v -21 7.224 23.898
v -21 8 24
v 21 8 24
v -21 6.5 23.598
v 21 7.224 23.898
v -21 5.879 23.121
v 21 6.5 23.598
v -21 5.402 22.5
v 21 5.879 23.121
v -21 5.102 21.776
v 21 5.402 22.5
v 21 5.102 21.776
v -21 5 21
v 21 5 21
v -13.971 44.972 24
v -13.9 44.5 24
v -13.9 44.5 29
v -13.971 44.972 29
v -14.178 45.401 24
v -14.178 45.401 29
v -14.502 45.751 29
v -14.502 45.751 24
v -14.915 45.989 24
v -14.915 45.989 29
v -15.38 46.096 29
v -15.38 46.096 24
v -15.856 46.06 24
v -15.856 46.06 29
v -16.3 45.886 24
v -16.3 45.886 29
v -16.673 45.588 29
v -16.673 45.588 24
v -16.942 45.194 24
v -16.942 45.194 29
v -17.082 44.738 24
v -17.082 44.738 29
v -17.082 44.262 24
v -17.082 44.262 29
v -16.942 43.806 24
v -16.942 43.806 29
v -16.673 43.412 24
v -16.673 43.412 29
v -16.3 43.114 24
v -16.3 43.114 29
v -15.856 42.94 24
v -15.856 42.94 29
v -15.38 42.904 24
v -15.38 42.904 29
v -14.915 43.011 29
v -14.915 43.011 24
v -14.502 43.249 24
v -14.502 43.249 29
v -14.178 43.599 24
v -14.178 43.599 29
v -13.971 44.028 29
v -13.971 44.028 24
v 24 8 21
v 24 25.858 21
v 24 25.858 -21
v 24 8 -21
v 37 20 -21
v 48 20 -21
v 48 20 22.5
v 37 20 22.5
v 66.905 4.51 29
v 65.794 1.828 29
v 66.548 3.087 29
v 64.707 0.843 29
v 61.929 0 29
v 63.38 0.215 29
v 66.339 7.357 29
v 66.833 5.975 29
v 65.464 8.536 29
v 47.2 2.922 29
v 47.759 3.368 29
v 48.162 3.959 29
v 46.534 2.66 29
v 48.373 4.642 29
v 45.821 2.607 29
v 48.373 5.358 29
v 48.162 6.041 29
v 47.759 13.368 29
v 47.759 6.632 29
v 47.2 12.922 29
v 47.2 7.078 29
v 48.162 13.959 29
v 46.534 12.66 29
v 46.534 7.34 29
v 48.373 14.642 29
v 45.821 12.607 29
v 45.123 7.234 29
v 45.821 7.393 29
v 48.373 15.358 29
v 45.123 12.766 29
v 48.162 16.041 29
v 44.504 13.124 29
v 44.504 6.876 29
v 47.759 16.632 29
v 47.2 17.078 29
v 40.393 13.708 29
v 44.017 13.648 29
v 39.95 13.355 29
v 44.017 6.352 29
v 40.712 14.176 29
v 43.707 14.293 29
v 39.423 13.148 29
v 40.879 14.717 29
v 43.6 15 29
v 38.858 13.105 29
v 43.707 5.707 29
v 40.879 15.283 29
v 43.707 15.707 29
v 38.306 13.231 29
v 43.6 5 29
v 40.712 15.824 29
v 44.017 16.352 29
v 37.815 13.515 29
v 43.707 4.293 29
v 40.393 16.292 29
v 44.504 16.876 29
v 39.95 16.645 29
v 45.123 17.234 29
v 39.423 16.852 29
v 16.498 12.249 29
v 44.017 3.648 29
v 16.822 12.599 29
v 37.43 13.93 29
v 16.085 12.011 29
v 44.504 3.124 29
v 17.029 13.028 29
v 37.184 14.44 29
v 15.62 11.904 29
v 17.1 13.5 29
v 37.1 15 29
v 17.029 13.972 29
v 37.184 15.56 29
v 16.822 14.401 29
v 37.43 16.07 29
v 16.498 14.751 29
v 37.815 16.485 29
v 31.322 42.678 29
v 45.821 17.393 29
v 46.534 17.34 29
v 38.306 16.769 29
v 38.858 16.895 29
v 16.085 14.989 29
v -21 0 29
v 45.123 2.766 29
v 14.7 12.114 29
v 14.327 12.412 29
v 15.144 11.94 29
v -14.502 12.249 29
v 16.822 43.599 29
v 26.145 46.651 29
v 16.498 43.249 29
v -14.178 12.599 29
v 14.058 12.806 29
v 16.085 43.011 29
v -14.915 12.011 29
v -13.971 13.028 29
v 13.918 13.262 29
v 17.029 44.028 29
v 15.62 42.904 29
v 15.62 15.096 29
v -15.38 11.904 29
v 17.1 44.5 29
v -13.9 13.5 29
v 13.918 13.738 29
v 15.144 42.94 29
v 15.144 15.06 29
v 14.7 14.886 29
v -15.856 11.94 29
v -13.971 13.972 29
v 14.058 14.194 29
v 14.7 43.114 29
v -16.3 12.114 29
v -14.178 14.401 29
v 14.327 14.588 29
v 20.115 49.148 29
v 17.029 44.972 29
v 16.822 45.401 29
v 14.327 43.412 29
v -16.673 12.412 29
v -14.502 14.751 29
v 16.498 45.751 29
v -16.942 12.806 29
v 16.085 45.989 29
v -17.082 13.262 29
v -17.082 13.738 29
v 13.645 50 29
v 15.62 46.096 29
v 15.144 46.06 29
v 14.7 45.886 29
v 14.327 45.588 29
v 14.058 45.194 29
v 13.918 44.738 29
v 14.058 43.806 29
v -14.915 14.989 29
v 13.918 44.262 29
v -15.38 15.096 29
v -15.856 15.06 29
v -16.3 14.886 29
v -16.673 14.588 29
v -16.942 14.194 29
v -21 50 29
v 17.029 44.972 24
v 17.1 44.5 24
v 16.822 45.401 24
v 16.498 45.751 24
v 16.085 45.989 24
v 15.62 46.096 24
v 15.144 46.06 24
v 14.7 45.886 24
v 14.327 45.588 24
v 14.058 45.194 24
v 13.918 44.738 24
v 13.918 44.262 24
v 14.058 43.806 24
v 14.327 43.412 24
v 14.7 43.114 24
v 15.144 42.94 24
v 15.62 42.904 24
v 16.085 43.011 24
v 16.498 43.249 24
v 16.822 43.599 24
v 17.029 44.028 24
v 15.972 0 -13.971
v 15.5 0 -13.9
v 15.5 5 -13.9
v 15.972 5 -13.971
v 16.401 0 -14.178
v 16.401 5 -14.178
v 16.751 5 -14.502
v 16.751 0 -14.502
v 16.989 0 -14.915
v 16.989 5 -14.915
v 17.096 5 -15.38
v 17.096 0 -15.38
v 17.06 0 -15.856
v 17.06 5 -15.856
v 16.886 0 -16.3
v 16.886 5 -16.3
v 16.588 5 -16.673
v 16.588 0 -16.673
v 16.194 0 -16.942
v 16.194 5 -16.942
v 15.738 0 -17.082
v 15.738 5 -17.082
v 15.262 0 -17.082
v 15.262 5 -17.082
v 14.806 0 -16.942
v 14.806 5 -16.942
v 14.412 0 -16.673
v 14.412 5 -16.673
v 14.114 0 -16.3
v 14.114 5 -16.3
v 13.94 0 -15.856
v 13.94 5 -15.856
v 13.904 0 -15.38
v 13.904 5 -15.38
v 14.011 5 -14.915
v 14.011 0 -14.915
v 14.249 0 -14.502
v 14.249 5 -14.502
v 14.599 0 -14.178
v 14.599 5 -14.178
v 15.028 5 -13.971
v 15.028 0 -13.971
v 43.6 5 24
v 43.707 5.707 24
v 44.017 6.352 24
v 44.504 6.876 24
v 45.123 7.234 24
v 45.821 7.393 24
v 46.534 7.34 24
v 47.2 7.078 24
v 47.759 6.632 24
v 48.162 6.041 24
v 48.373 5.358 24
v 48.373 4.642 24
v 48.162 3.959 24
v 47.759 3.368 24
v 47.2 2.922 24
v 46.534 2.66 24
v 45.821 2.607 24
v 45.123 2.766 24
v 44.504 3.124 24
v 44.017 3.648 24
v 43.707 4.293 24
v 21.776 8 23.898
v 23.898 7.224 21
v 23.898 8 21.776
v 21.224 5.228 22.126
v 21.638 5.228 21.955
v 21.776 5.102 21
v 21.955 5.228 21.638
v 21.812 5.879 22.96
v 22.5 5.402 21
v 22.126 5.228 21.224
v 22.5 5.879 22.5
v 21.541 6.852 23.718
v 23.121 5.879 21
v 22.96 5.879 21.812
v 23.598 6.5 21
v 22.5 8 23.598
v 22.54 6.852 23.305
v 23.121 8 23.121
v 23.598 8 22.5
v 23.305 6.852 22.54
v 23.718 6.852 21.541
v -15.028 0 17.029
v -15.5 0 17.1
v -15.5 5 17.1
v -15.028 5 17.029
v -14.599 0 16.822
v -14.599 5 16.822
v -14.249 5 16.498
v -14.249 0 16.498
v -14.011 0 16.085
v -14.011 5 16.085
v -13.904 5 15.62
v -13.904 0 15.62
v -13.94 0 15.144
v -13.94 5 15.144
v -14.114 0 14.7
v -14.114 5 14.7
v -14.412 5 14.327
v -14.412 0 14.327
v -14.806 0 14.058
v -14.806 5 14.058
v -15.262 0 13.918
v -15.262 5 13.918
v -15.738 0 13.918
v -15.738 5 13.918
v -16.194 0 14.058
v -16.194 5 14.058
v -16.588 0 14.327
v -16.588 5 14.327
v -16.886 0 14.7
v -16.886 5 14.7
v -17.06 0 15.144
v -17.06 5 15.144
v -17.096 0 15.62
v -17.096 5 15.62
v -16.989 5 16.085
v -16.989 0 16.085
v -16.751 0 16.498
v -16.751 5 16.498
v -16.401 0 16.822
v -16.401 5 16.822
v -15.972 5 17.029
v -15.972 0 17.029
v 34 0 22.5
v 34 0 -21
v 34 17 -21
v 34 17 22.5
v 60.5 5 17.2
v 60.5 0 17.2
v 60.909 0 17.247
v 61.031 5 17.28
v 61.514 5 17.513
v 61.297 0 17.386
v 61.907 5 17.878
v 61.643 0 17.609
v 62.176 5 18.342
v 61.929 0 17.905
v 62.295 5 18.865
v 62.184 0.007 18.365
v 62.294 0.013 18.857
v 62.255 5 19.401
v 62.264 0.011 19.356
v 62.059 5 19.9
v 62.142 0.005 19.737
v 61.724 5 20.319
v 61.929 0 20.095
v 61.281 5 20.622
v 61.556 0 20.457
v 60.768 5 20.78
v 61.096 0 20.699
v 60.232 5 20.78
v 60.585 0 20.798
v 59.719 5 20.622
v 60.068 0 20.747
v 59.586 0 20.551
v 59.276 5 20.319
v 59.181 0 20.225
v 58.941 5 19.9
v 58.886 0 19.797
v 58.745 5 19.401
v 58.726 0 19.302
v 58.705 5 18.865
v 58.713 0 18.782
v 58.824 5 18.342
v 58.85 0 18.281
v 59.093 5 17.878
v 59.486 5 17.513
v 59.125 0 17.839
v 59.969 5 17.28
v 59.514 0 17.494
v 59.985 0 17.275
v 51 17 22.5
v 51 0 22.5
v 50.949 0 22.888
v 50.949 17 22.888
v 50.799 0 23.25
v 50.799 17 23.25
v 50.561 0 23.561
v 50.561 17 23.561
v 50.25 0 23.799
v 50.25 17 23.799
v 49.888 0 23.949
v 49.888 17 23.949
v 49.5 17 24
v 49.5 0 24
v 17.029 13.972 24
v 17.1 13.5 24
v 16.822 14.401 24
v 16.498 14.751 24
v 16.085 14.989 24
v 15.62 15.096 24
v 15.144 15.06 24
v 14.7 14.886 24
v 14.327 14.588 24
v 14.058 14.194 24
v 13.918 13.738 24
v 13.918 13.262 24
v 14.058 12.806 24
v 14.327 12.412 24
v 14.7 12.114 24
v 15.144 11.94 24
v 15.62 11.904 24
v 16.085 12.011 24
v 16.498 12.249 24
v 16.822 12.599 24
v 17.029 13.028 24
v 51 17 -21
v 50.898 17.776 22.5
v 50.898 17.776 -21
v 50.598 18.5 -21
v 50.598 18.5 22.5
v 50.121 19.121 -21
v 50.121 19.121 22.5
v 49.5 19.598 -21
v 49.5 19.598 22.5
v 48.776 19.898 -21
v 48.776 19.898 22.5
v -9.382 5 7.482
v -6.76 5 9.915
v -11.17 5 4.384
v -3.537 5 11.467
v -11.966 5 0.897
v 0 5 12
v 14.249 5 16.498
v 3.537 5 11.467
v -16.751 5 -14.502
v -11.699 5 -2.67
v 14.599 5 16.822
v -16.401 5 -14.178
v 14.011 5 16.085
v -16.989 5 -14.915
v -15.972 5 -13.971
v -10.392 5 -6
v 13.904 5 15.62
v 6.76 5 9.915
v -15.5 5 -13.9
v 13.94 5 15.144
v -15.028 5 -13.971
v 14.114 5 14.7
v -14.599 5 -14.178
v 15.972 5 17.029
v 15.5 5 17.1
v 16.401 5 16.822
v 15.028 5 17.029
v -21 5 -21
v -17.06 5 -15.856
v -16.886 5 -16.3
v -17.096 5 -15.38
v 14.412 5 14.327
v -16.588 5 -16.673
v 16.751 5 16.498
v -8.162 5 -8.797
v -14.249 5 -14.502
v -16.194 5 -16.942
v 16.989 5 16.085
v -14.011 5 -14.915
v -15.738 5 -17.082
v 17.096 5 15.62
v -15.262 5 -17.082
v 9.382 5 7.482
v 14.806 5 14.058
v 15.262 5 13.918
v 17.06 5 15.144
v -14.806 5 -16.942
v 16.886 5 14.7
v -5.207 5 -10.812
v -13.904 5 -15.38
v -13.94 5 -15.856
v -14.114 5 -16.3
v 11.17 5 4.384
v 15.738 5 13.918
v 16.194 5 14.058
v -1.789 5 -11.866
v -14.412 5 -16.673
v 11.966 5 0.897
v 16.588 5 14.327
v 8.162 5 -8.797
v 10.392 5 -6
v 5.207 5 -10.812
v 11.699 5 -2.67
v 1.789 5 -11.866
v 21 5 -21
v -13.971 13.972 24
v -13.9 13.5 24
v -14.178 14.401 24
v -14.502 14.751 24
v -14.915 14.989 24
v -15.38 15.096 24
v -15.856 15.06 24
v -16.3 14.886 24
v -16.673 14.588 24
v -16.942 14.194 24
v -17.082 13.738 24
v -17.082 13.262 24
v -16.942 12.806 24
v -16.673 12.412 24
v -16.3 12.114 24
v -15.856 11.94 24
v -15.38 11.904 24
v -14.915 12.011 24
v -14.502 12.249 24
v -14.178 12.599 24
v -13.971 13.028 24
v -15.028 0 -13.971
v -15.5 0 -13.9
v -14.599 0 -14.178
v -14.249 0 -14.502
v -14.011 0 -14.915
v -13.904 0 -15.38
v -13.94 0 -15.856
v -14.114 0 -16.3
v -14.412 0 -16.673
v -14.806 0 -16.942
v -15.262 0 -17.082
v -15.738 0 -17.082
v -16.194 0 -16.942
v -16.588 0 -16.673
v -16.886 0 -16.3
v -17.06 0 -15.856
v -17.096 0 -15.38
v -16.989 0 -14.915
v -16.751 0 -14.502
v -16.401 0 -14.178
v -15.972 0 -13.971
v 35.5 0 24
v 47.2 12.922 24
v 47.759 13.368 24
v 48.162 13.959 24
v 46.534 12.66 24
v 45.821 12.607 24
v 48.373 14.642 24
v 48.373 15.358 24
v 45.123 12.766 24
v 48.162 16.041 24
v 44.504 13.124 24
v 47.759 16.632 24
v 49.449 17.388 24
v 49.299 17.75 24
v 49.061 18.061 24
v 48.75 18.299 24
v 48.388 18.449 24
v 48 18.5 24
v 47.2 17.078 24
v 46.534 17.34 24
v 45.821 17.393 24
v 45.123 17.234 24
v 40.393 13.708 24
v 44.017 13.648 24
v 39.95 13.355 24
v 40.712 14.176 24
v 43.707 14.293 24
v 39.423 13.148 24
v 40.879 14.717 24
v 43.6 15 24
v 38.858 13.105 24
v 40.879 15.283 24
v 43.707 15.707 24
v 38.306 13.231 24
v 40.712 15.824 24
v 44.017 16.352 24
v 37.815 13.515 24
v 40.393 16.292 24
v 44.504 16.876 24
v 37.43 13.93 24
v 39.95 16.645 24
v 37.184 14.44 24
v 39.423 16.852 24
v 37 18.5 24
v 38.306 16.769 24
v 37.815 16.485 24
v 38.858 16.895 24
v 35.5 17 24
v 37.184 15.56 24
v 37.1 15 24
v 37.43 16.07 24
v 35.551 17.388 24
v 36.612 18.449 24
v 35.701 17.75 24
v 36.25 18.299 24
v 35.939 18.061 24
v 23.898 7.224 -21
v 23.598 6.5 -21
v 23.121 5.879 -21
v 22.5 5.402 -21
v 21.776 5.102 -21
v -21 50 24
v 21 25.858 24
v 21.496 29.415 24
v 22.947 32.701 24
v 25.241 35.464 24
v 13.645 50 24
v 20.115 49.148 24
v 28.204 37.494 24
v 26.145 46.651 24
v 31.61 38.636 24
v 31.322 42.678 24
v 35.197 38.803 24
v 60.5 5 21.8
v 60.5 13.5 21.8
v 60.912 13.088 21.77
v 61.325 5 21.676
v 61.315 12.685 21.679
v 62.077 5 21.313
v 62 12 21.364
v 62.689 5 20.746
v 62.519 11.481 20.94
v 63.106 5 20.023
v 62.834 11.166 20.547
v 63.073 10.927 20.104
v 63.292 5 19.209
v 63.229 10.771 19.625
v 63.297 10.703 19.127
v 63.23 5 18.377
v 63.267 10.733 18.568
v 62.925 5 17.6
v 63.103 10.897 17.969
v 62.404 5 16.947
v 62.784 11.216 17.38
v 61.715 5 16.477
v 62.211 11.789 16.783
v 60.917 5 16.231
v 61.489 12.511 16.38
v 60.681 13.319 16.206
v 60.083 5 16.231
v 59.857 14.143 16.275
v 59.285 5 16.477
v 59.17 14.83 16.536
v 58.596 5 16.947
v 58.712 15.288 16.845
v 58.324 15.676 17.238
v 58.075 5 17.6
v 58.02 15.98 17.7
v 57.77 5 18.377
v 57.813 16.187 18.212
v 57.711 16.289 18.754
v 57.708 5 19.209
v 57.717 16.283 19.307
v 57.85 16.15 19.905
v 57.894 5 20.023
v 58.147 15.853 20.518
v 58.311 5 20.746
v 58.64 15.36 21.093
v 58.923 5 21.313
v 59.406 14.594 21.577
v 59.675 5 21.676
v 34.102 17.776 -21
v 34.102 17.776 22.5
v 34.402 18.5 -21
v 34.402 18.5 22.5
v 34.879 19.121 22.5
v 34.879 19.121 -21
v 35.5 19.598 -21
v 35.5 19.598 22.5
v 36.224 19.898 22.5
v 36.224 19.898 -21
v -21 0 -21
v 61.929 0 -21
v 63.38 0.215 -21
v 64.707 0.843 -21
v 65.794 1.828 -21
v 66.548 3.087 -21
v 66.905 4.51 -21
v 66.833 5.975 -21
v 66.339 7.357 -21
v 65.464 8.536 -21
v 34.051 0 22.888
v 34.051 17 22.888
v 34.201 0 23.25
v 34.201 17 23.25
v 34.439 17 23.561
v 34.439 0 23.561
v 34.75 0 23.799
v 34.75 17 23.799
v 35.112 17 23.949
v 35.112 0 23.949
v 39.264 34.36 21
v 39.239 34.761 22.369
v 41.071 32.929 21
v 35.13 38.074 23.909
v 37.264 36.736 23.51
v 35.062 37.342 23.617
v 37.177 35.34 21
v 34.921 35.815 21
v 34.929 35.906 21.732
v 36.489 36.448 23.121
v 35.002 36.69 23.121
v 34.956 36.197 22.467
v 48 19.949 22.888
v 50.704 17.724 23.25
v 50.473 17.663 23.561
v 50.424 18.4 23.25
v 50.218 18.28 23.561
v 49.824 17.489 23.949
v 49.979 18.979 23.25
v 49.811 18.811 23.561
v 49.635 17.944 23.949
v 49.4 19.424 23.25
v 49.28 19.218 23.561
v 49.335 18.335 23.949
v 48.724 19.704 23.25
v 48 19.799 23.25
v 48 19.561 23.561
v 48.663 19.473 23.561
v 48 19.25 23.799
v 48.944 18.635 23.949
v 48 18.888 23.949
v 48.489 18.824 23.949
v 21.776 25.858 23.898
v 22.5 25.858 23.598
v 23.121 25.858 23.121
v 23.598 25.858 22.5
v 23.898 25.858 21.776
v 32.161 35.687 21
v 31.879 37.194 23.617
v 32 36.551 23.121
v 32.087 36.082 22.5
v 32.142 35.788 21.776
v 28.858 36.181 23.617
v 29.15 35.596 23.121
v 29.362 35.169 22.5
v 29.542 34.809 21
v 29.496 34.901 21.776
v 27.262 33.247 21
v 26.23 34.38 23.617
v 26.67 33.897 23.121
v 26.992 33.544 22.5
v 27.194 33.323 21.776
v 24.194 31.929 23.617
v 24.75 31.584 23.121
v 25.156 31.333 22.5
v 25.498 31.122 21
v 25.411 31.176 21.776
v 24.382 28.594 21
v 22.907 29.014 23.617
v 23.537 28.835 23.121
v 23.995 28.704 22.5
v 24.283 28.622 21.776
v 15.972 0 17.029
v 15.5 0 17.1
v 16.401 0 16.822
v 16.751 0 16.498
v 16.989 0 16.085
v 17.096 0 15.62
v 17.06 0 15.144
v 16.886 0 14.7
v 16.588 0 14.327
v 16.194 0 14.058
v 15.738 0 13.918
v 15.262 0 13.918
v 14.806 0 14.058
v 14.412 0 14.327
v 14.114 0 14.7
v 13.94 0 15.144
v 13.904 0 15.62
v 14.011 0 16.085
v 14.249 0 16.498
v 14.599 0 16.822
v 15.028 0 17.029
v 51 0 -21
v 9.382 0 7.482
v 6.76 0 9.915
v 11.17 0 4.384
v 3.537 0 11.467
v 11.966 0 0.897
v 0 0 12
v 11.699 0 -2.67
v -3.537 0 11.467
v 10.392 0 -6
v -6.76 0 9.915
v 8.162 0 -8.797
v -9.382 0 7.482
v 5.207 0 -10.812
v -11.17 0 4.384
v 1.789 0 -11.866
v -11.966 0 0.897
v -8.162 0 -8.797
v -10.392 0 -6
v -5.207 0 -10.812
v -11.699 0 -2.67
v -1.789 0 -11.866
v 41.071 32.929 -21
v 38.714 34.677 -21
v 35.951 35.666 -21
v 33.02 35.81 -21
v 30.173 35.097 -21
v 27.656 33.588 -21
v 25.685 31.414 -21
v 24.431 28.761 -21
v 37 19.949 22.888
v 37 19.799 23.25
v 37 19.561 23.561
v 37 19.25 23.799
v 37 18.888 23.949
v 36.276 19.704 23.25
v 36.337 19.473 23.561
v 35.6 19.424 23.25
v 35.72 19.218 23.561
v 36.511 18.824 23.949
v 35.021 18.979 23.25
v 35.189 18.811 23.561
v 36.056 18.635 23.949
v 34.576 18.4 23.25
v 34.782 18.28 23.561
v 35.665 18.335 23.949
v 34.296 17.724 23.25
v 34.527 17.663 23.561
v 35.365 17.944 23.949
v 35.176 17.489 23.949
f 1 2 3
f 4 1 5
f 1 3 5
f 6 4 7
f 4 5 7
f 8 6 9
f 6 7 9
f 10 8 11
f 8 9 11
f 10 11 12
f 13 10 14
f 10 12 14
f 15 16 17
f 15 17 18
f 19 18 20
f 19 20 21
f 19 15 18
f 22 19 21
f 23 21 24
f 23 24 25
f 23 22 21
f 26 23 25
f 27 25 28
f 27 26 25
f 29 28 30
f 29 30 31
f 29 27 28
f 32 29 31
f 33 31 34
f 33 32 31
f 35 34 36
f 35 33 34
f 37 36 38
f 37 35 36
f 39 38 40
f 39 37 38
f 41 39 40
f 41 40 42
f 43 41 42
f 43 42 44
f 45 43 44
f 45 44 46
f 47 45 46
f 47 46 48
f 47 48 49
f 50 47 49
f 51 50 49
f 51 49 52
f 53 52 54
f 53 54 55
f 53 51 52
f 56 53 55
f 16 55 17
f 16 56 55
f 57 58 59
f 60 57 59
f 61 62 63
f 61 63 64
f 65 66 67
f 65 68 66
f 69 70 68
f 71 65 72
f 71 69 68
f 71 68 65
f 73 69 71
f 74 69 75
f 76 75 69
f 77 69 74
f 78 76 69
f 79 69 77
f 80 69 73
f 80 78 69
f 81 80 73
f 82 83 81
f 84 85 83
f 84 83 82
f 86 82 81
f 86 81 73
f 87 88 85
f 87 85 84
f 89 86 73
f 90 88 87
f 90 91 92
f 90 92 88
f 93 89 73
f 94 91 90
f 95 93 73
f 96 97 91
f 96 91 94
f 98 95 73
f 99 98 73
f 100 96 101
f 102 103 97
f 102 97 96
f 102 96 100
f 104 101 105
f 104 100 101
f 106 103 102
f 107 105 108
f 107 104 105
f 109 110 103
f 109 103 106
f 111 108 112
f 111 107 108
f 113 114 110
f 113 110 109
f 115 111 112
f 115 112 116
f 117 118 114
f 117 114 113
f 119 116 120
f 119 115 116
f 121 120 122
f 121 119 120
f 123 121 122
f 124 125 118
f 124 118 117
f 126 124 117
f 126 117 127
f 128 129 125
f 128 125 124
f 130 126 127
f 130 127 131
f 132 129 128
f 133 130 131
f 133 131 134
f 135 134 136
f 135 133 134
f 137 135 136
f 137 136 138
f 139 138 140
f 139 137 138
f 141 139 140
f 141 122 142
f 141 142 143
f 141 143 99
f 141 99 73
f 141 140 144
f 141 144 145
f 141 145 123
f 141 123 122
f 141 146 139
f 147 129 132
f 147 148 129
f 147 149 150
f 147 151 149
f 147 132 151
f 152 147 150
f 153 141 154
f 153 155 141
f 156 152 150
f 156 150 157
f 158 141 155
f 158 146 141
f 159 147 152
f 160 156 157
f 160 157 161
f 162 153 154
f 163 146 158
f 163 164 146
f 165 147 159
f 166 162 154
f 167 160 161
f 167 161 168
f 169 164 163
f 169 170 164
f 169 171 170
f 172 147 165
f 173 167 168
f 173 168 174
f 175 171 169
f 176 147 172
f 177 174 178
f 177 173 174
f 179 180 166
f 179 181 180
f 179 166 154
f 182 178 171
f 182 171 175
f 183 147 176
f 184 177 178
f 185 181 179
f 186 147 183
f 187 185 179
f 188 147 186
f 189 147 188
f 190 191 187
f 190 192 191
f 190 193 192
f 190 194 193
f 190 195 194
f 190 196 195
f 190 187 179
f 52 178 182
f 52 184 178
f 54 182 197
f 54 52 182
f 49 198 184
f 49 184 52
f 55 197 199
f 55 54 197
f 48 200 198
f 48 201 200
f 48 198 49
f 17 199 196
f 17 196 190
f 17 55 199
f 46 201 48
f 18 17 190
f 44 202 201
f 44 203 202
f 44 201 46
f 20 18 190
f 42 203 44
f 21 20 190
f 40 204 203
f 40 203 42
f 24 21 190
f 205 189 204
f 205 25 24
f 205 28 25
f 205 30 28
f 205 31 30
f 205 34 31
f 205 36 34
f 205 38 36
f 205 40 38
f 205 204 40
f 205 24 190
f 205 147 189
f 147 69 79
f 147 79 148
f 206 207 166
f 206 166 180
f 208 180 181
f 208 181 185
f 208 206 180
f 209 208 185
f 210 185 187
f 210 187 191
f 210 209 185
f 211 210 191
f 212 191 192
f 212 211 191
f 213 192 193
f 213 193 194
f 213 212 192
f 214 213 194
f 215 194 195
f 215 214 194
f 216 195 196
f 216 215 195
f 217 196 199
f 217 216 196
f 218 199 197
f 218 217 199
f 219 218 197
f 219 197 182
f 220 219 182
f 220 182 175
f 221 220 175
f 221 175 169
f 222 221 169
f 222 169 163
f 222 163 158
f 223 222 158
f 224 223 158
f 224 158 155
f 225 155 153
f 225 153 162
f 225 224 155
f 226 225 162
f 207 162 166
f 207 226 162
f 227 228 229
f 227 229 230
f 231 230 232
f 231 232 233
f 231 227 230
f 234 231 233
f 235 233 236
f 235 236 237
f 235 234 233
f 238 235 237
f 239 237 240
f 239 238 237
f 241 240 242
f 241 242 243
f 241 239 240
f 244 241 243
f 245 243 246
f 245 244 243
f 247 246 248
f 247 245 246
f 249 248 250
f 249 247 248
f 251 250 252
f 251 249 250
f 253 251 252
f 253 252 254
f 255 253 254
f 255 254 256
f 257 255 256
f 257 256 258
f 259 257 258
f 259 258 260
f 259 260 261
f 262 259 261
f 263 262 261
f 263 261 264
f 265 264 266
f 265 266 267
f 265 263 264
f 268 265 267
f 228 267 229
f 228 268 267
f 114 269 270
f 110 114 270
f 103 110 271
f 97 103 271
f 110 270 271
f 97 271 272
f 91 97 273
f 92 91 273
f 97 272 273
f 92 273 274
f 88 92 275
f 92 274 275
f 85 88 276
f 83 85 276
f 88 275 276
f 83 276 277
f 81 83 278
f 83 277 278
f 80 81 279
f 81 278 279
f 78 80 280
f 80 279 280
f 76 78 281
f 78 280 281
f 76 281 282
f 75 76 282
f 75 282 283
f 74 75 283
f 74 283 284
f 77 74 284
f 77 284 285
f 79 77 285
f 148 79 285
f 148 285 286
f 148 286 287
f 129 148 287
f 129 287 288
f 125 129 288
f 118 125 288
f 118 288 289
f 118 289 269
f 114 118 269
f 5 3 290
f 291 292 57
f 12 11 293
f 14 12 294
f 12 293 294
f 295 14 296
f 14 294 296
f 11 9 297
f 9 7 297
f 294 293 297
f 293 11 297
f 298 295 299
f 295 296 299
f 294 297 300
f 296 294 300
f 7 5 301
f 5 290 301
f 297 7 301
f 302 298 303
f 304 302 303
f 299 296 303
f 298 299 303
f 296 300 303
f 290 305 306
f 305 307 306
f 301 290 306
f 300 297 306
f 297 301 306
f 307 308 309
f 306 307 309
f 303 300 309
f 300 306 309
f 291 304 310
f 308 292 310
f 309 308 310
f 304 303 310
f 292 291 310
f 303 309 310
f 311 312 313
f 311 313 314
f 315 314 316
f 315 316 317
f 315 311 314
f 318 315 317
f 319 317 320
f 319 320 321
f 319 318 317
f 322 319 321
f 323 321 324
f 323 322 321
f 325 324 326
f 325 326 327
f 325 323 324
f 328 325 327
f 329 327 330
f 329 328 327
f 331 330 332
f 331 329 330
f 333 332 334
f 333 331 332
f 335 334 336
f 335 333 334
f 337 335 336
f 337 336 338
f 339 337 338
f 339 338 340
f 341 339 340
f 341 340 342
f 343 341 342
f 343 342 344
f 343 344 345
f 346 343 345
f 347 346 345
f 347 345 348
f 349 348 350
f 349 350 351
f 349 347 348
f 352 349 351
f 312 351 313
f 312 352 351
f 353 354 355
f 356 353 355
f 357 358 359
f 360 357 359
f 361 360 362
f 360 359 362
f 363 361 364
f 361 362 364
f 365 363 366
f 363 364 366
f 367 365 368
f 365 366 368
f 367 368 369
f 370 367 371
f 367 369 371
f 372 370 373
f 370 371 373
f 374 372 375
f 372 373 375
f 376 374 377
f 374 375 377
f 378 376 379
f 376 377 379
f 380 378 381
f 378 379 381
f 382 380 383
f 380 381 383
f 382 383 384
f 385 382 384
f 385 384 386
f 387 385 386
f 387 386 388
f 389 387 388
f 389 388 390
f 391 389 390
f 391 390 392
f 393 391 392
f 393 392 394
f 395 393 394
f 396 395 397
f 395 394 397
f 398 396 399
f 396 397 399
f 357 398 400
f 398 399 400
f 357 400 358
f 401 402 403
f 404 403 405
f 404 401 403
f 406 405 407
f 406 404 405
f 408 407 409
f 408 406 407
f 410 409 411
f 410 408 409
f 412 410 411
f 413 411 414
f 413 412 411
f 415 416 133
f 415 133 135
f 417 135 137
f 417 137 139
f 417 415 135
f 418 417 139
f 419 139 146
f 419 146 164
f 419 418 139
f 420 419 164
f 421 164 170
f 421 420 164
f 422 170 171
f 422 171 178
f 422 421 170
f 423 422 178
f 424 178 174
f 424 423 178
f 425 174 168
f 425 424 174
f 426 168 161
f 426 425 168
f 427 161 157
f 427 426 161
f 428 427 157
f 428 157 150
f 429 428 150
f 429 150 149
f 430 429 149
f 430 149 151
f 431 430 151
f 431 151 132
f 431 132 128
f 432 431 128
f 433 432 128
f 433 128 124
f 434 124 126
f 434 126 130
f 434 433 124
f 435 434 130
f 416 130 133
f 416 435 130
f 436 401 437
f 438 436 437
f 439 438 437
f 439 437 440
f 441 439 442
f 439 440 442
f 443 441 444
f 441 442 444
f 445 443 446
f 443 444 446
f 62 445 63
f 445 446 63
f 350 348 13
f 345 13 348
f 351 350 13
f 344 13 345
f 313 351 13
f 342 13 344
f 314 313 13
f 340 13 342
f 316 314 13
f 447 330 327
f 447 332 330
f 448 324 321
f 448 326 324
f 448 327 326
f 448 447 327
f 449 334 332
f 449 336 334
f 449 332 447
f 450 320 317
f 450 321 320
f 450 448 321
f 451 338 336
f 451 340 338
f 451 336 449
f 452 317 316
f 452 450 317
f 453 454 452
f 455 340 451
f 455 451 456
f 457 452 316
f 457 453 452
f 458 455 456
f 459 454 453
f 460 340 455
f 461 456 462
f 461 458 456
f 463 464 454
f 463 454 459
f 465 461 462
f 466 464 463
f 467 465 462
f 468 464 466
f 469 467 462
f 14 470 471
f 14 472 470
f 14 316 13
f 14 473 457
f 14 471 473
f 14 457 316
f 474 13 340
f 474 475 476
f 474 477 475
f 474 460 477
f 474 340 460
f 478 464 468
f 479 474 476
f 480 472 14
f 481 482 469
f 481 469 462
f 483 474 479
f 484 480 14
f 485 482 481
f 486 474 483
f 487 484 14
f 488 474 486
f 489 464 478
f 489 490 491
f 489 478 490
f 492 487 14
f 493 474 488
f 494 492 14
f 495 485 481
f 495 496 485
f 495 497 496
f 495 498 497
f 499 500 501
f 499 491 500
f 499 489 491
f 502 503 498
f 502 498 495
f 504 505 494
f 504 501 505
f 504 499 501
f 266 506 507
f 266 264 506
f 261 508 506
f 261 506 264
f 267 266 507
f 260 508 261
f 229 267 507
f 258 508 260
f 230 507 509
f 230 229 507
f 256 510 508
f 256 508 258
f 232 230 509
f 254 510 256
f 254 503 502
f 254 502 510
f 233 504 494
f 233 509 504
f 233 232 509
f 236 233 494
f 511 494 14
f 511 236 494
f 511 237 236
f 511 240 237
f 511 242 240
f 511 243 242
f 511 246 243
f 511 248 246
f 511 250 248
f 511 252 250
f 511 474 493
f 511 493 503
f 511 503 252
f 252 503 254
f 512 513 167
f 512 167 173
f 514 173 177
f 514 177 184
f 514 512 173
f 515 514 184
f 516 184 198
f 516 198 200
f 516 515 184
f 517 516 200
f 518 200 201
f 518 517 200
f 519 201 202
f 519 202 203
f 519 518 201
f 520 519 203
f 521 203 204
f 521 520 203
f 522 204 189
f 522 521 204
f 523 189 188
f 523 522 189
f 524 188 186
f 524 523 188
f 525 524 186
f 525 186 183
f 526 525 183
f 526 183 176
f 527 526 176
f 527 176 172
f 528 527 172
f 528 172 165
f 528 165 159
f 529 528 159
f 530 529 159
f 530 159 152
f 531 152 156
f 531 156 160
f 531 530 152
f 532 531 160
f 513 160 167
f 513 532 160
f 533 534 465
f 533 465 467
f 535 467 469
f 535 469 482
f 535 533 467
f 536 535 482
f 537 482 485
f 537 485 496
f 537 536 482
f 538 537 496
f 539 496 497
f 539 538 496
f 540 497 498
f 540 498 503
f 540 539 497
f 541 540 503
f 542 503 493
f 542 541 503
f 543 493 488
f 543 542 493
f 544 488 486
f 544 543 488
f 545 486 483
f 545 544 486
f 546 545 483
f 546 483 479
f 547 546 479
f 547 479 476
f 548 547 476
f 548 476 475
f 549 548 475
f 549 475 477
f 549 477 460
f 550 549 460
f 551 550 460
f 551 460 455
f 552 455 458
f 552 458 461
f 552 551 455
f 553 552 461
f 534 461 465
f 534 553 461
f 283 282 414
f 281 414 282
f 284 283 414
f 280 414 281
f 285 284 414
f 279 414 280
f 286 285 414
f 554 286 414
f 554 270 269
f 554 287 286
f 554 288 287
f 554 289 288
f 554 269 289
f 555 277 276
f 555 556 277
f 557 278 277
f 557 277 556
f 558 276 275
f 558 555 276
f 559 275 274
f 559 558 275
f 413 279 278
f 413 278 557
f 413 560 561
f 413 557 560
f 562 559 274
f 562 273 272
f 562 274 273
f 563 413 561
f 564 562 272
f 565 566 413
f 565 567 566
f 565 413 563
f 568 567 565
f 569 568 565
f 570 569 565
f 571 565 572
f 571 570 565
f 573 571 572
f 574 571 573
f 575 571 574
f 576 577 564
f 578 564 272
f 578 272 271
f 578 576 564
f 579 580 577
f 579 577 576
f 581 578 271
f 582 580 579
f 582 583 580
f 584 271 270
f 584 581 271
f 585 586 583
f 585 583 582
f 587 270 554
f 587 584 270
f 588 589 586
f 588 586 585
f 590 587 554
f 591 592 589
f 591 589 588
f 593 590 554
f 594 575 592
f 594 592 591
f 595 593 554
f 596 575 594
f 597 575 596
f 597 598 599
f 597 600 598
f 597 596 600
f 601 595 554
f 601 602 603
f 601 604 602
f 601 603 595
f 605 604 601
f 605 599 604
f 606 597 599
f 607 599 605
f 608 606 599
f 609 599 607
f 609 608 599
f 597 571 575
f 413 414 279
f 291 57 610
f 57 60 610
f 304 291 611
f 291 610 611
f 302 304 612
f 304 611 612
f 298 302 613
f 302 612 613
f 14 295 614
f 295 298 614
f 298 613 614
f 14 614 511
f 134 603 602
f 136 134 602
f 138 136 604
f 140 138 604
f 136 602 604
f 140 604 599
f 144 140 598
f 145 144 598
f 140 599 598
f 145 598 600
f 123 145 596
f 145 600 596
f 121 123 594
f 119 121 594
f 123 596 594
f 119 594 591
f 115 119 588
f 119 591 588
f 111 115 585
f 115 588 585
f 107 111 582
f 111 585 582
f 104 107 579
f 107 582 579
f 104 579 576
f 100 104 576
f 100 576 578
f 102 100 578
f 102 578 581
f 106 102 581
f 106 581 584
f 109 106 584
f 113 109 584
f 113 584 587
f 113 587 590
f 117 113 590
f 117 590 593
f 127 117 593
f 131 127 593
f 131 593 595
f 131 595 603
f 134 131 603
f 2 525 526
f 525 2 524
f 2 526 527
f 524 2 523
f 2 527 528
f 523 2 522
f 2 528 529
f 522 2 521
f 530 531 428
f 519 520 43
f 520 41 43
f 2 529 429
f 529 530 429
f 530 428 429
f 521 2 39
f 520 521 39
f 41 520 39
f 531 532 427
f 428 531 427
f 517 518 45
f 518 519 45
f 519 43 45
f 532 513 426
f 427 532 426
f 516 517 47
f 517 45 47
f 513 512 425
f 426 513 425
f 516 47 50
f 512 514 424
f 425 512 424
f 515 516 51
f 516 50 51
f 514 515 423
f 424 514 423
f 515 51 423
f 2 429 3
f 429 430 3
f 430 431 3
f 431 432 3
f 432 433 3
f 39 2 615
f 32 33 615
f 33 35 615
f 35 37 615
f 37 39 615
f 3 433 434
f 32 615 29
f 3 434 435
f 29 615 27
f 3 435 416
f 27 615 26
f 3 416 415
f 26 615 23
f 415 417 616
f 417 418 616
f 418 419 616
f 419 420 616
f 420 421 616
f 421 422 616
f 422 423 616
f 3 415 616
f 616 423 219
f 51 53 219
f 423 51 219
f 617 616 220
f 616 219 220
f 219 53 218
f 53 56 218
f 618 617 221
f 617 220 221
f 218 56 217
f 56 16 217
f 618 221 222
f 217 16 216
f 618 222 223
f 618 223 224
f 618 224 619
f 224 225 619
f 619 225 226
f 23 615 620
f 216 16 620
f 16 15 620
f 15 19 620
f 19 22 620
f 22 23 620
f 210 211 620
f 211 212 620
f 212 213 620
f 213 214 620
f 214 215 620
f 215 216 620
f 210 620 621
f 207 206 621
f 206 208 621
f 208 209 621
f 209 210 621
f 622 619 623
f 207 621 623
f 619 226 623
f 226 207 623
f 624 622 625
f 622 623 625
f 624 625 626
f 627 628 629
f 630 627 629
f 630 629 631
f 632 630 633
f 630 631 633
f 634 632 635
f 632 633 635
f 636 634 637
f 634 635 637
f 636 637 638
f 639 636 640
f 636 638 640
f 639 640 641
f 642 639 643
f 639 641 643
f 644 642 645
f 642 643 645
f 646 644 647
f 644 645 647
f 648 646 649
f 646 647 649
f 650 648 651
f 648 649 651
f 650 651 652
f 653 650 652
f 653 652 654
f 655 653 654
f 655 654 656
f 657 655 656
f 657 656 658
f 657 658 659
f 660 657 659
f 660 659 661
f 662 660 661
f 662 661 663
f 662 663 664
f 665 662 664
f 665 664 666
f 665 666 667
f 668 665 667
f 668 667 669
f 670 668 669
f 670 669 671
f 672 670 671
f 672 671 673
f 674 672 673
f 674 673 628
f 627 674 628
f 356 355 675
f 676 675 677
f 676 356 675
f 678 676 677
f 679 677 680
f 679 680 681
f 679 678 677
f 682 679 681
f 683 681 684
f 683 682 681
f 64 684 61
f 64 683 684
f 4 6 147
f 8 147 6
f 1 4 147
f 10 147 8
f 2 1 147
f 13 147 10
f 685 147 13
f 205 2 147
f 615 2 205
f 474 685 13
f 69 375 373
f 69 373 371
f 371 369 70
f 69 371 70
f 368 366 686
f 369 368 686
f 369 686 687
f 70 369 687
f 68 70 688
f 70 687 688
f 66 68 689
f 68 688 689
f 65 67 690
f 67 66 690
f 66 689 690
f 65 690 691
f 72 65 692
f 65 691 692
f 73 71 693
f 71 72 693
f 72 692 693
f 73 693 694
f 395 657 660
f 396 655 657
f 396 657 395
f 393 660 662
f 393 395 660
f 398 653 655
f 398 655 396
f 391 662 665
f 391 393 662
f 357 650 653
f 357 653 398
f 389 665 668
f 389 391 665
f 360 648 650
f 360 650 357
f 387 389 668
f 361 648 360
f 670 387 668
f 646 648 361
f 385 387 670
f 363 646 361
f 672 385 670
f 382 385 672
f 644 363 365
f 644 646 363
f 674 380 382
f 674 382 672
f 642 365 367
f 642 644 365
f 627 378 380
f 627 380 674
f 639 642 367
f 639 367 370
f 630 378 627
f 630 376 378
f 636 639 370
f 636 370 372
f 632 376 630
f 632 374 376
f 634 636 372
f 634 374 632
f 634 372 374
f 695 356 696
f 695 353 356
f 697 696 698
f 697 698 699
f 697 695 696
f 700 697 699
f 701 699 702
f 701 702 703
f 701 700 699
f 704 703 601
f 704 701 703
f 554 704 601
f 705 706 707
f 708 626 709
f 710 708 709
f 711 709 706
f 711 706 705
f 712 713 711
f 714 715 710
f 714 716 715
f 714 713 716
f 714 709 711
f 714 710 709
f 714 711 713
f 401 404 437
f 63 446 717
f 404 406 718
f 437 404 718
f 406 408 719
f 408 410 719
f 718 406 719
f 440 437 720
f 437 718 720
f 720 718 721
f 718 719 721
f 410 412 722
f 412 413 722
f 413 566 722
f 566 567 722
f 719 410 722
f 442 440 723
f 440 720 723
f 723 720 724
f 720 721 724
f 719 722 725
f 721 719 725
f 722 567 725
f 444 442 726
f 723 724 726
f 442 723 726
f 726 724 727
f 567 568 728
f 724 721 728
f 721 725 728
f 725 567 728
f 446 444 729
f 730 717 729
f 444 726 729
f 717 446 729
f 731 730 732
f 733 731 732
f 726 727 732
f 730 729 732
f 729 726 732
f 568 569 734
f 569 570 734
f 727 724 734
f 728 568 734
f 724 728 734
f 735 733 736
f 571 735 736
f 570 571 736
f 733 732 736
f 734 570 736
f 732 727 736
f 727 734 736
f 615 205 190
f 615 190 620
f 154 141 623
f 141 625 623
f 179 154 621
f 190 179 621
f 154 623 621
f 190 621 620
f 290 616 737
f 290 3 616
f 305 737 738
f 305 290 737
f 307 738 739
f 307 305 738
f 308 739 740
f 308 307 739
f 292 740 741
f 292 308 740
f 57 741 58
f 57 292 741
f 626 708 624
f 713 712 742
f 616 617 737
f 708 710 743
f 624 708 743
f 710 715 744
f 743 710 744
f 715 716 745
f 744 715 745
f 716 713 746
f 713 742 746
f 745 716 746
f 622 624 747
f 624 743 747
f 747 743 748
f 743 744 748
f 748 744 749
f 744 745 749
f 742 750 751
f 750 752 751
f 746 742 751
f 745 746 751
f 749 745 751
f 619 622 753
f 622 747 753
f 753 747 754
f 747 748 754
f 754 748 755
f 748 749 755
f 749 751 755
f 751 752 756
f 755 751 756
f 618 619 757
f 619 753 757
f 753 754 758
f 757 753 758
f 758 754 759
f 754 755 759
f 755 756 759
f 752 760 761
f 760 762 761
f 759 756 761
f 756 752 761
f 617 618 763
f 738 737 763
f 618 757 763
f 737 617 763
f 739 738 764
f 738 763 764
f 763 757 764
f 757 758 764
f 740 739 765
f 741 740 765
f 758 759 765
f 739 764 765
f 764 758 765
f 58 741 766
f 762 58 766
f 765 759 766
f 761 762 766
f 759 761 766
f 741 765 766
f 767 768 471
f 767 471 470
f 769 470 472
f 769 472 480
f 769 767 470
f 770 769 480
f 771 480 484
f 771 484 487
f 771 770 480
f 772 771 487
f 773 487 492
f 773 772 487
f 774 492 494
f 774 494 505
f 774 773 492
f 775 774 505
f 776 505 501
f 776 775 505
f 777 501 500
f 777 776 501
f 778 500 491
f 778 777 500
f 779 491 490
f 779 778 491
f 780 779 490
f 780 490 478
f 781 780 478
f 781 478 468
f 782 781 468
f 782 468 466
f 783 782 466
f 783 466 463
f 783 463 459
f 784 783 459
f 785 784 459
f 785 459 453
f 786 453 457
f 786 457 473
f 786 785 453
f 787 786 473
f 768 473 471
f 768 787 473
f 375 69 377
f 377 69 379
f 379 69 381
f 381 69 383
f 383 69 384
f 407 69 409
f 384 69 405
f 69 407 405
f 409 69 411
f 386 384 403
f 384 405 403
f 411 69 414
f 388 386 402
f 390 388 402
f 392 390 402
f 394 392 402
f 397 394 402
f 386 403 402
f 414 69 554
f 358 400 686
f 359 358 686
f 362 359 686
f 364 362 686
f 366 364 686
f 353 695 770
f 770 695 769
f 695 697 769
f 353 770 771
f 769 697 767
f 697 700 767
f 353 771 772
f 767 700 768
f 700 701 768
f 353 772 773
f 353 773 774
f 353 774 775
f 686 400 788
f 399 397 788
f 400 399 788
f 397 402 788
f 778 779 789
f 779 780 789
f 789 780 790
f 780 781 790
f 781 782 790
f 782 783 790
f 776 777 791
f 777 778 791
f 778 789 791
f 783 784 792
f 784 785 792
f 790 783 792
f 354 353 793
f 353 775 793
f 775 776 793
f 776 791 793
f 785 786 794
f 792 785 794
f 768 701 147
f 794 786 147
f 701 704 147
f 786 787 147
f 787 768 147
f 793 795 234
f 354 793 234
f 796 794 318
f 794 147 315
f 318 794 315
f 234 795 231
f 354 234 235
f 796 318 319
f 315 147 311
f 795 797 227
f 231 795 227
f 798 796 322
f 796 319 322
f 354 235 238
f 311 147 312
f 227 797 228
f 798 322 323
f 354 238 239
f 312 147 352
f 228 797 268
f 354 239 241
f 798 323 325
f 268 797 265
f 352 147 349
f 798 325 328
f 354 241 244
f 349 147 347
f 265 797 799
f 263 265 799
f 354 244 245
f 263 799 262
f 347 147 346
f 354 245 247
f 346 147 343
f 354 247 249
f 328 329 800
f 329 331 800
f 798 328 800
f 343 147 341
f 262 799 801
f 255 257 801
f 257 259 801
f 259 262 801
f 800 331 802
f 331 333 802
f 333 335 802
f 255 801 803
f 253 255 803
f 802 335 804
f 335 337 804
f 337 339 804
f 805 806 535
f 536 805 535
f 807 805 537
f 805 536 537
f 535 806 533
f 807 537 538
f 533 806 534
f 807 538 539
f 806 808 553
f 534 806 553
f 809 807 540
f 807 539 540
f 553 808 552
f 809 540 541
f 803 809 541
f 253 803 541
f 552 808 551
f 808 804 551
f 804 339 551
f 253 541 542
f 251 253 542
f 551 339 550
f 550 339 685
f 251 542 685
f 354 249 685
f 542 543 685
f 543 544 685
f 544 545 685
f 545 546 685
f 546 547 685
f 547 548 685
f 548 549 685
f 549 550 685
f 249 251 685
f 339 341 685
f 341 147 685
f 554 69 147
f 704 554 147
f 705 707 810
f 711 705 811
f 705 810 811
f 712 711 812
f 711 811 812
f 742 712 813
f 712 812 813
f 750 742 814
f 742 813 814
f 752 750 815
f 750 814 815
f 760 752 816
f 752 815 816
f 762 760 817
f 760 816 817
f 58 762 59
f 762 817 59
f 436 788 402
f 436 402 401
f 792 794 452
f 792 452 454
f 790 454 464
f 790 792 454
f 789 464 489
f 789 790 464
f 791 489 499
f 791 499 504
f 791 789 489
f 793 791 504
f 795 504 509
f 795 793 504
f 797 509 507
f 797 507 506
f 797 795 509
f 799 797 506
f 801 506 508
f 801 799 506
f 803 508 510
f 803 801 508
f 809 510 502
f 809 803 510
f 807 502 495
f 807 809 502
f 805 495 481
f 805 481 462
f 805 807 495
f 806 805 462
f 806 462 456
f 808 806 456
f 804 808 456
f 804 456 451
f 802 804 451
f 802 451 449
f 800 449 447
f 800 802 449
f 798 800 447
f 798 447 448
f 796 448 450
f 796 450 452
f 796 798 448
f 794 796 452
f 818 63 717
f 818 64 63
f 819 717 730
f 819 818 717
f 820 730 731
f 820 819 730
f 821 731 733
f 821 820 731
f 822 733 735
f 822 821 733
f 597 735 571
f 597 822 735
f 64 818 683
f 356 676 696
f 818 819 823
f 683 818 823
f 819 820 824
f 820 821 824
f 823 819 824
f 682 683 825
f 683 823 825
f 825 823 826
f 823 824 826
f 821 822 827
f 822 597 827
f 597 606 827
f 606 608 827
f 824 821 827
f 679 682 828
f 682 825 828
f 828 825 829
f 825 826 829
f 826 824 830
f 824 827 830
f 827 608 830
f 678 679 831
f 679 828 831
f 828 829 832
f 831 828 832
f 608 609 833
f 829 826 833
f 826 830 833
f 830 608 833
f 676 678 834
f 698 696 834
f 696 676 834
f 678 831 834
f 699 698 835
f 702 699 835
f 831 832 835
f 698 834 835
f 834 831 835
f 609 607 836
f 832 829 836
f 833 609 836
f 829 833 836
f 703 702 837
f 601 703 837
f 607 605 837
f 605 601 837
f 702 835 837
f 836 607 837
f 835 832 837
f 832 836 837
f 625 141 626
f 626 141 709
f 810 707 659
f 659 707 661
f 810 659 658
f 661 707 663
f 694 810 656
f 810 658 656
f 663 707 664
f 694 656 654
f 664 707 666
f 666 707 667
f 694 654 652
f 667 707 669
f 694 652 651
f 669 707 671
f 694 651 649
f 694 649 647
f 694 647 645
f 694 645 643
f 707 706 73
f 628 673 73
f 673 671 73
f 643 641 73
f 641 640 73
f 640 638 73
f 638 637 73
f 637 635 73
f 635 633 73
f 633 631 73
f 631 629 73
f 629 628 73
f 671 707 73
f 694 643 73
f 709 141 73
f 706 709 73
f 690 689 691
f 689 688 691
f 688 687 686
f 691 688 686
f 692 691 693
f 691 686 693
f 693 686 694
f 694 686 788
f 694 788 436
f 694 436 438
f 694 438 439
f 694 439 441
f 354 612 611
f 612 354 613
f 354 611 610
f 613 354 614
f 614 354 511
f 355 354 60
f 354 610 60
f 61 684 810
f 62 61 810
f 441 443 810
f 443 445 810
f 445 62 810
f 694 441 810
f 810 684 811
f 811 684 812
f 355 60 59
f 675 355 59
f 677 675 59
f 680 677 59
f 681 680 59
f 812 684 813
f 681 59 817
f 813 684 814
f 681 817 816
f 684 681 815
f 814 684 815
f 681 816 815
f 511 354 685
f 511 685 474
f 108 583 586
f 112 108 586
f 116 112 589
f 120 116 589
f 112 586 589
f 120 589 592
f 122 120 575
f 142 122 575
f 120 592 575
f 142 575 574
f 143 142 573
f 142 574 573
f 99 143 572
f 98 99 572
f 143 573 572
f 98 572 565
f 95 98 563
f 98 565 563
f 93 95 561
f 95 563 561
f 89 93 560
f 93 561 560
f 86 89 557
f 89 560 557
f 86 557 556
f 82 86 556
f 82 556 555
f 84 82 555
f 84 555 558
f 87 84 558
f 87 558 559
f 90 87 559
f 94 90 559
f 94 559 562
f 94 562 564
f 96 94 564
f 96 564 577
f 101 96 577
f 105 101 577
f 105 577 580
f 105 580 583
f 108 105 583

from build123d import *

# Parameters (mm, degrees)
SKETCH_1_R          = 1.6
SKETCH_1_R_2        = 12
EXTRUDE_1_DEPTH     = 5
SKETCH_4_W          = 45
SKETCH_4_H          = 50
SKETCH_4_R          = 1.6
EXTRUDE_4_DEPTH     = 5
SKETCH_5_W          = 50
SKETCH_5_H          = 50
EXTRUDE_5_DEPTH     = 50
SKETCH_6_R          = 2.4
SKETCH_6_R_2        = 1.9
CUT_EXTRUDE_1_DEPTH = 103.352332655
SKETCH_7_R          = 1.8
CUT_EXTRUDE_2_DEPTH = 94.898881782
SKETCH_8_R          = 2.8
CUT_EXTRUDE_3_DEPTH = 45
SKETCH_9_W          = 17
SKETCH_9_H          = 20
CUT_EXTRUDE_4_DEPTH = 45
CHAMFER_1_SIZE      = 50
FILLET_1_R          = 5
FILLET_4_R          = 10
FILLET_5_R          = 25
FILLET_6_R          = 3
FILLET_7_R          = 1.5


with BuildPart() as part:
    # 草图1 → 凸台-拉伸1 (new body)
    with BuildSketch(Plane(origin=(0, 0, 0), x_dir=(1, 0, 0), z_dir=(0, 1, 0))):
        Polygon((24, -24), (24, 21), (21, 21), (-21, 21), (-21, -21), (-21, -24), align=None)
        with Locations(Location((-15.5, 15.5, 0), (0, 0, 270))):
            Circle(SKETCH_1_R, mode=Mode.SUBTRACT)
        with Locations(Location((15.5, 15.5, 0), (0, 0, 270))):
            Circle(SKETCH_1_R, mode=Mode.SUBTRACT)
        with Locations(Location((-15.5, -15.5, 0), (0, 0, 270))):
            Circle(SKETCH_1_R, mode=Mode.SUBTRACT)
        with Locations(Location((15.5, -15.5, 0), (0, 0, 270))):
            Circle(SKETCH_1_R, mode=Mode.SUBTRACT)
        with Locations(Location((0, 0, 0), (0, 0, 270))):
            Circle(SKETCH_1_R_2, mode=Mode.SUBTRACT)
    extrude(amount=EXTRUDE_1_DEPTH)

    # 草图4 → 凸台-拉伸4 (add)
    with BuildSketch(Plane.XY.offset(24)):
        with Locations((1.5, 25)):
            Rectangle(SKETCH_4_W, SKETCH_4_H)
        with Locations((-15.5, 44.5)):
            Circle(SKETCH_4_R, mode=Mode.SUBTRACT)
        with Locations((15.5, 44.5)):
            Circle(SKETCH_4_R, mode=Mode.SUBTRACT)
        with Locations((-15.5, 13.5)):
            Circle(SKETCH_4_R, mode=Mode.SUBTRACT)
        with Locations((15.5, 13.5)):
            Circle(SKETCH_4_R, mode=Mode.SUBTRACT)
    extrude(amount=EXTRUDE_4_DEPTH)

    # 草图5 → 凸台-拉伸5 (add)
    with BuildSketch(Plane(origin=(24, 0, 0), x_dir=(0, 0, -1), z_dir=(1, 0, 0))):
        with Locations((-4, 25)):
            Rectangle(SKETCH_5_W, SKETCH_5_H)
    extrude(amount=EXTRUDE_5_DEPTH)

    # 草图6 → 切除-拉伸1 (cut, through all)
    with BuildSketch(Plane(origin=(0, 0, -21), x_dir=(-1, 0, 0), z_dir=(0, 0, -1))):
        with Locations((-46, 5)):
            Circle(SKETCH_6_R)
        with Locations((-46, 15)):
            Circle(SKETCH_6_R)
        with Locations((-39, 15)):
            Circle(SKETCH_6_R_2)
    extrude(amount=-CUT_EXTRUDE_1_DEPTH, mode=Mode.SUBTRACT)

    # 草图7 → 切除-拉伸2 (cut, through all)
    with BuildSketch(Plane.XZ):
        with Locations(Location((60.5, 19, 0), (0, 0, 270))):
            Circle(SKETCH_7_R)
    extrude(amount=-CUT_EXTRUDE_2_DEPTH, mode=Mode.SUBTRACT)

    # 草图8 → 切除-拉伸3 (cut)
    with BuildSketch(Plane(origin=(0, 50, 0), x_dir=(1, 0, 0), z_dir=(0, 1, 0))):
        with Locations(Location((60.5, -19, 0), (0, 0, 270))):
            Circle(SKETCH_8_R)
    extrude(amount=-CUT_EXTRUDE_3_DEPTH, mode=Mode.SUBTRACT)

    # 草图9 → 切除-拉伸4 (cut)
    with BuildSketch(Plane(origin=(0, 0, -21), x_dir=(-1, 0, 0), z_dir=(0, 0, -1))):
        with Locations((-42.5, 10)):
            Rectangle(SKETCH_9_W, SKETCH_9_H)
    extrude(amount=-CUT_EXTRUDE_4_DEPTH, mode=Mode.SUBTRACT)

    # 倒角1
    # the kernel refuses this chamfer: 50 mm, written as the material it takes off along each edge
    with BuildSketch(Plane(origin=(74, 50, 157.584149398), x_dir=(-0.9996219169112969, 0.027495876610586317, 0), z_dir=(0, 0, -1))) as chamfer_1_piece_1:
        Polygon((CHAMFER_1_SIZE * 0.999621916911, -CHAMFER_1_SIZE * 0.0274958766106), (-CHAMFER_1_SIZE * 0.0274958766106, -CHAMFER_1_SIZE * 0.999621916911), (0, 0), align=None)
    extrude(amount=307.168298797, mode=Mode.SUBTRACT)

    # 圆角1
    # the kernel refuses this fillet: 5 mm, written as the material it takes off along each edge
    with BuildSketch(Plane(origin=(74, 0, -51.17766953), x_dir=(-0.707106781186265, 0.7071067811868301, 0), z_dir=(0, 0, 1))) as fillet_1_piece_1:
        with BuildLine():
            CenterArc((FILLET_1_R * 2.41421356237, FILLET_1_R), FILLET_1_R, 135, 135)
            Line((FILLET_1_R * 1.70710678118, FILLET_1_R * 1.70710678119), (0, 0))
            Line((0, 0), (FILLET_1_R * 2.41421356237, 0))
        make_face()
    extrude(amount=110.355339059, mode=Mode.SUBTRACT)

    # 圆角4
    fillet_4_edges = [part.edges().sort_by_distance(p)[0] for p in [
        (24, 50, 1.5),
    ]]
    fillet(fillet_4_edges, radius=FILLET_4_R)

    # 圆角5
    fillet_5_edges = [part.edges().sort_by_distance(p)[0] for p in [
        (24, 50, 26.5),
    ]]
    fillet(fillet_5_edges, radius=FILLET_5_R)

    # 圆角6
    fillet_6_edges = [part.edges().sort_by_distance(p)[0] for p in [
        (30.173165676, 35.096659701, 24),
        (24, 15.428932188, 24),
        (1.5, 5, 24),
        (24, 5, 1.5),
        (34, 20, 1.5),
        (51, 20, 1.5),
    ]]
    fillet(fillet_6_edges, radius=FILLET_6_R)

    # 圆角7
    fillet_7_edges = [part.edges().sort_by_distance(p)[0] for p in [
        (51, 8.5, 24),
        (42.5, 20, 24),
        (34, 8.5, 24),
        (50.121320344, 19.121320344, 24),
        (34.878679656, 19.121320344, 24),
    ]]
    fillet(fillet_7_edges, radius=FILLET_7_R)


solid = part.part
